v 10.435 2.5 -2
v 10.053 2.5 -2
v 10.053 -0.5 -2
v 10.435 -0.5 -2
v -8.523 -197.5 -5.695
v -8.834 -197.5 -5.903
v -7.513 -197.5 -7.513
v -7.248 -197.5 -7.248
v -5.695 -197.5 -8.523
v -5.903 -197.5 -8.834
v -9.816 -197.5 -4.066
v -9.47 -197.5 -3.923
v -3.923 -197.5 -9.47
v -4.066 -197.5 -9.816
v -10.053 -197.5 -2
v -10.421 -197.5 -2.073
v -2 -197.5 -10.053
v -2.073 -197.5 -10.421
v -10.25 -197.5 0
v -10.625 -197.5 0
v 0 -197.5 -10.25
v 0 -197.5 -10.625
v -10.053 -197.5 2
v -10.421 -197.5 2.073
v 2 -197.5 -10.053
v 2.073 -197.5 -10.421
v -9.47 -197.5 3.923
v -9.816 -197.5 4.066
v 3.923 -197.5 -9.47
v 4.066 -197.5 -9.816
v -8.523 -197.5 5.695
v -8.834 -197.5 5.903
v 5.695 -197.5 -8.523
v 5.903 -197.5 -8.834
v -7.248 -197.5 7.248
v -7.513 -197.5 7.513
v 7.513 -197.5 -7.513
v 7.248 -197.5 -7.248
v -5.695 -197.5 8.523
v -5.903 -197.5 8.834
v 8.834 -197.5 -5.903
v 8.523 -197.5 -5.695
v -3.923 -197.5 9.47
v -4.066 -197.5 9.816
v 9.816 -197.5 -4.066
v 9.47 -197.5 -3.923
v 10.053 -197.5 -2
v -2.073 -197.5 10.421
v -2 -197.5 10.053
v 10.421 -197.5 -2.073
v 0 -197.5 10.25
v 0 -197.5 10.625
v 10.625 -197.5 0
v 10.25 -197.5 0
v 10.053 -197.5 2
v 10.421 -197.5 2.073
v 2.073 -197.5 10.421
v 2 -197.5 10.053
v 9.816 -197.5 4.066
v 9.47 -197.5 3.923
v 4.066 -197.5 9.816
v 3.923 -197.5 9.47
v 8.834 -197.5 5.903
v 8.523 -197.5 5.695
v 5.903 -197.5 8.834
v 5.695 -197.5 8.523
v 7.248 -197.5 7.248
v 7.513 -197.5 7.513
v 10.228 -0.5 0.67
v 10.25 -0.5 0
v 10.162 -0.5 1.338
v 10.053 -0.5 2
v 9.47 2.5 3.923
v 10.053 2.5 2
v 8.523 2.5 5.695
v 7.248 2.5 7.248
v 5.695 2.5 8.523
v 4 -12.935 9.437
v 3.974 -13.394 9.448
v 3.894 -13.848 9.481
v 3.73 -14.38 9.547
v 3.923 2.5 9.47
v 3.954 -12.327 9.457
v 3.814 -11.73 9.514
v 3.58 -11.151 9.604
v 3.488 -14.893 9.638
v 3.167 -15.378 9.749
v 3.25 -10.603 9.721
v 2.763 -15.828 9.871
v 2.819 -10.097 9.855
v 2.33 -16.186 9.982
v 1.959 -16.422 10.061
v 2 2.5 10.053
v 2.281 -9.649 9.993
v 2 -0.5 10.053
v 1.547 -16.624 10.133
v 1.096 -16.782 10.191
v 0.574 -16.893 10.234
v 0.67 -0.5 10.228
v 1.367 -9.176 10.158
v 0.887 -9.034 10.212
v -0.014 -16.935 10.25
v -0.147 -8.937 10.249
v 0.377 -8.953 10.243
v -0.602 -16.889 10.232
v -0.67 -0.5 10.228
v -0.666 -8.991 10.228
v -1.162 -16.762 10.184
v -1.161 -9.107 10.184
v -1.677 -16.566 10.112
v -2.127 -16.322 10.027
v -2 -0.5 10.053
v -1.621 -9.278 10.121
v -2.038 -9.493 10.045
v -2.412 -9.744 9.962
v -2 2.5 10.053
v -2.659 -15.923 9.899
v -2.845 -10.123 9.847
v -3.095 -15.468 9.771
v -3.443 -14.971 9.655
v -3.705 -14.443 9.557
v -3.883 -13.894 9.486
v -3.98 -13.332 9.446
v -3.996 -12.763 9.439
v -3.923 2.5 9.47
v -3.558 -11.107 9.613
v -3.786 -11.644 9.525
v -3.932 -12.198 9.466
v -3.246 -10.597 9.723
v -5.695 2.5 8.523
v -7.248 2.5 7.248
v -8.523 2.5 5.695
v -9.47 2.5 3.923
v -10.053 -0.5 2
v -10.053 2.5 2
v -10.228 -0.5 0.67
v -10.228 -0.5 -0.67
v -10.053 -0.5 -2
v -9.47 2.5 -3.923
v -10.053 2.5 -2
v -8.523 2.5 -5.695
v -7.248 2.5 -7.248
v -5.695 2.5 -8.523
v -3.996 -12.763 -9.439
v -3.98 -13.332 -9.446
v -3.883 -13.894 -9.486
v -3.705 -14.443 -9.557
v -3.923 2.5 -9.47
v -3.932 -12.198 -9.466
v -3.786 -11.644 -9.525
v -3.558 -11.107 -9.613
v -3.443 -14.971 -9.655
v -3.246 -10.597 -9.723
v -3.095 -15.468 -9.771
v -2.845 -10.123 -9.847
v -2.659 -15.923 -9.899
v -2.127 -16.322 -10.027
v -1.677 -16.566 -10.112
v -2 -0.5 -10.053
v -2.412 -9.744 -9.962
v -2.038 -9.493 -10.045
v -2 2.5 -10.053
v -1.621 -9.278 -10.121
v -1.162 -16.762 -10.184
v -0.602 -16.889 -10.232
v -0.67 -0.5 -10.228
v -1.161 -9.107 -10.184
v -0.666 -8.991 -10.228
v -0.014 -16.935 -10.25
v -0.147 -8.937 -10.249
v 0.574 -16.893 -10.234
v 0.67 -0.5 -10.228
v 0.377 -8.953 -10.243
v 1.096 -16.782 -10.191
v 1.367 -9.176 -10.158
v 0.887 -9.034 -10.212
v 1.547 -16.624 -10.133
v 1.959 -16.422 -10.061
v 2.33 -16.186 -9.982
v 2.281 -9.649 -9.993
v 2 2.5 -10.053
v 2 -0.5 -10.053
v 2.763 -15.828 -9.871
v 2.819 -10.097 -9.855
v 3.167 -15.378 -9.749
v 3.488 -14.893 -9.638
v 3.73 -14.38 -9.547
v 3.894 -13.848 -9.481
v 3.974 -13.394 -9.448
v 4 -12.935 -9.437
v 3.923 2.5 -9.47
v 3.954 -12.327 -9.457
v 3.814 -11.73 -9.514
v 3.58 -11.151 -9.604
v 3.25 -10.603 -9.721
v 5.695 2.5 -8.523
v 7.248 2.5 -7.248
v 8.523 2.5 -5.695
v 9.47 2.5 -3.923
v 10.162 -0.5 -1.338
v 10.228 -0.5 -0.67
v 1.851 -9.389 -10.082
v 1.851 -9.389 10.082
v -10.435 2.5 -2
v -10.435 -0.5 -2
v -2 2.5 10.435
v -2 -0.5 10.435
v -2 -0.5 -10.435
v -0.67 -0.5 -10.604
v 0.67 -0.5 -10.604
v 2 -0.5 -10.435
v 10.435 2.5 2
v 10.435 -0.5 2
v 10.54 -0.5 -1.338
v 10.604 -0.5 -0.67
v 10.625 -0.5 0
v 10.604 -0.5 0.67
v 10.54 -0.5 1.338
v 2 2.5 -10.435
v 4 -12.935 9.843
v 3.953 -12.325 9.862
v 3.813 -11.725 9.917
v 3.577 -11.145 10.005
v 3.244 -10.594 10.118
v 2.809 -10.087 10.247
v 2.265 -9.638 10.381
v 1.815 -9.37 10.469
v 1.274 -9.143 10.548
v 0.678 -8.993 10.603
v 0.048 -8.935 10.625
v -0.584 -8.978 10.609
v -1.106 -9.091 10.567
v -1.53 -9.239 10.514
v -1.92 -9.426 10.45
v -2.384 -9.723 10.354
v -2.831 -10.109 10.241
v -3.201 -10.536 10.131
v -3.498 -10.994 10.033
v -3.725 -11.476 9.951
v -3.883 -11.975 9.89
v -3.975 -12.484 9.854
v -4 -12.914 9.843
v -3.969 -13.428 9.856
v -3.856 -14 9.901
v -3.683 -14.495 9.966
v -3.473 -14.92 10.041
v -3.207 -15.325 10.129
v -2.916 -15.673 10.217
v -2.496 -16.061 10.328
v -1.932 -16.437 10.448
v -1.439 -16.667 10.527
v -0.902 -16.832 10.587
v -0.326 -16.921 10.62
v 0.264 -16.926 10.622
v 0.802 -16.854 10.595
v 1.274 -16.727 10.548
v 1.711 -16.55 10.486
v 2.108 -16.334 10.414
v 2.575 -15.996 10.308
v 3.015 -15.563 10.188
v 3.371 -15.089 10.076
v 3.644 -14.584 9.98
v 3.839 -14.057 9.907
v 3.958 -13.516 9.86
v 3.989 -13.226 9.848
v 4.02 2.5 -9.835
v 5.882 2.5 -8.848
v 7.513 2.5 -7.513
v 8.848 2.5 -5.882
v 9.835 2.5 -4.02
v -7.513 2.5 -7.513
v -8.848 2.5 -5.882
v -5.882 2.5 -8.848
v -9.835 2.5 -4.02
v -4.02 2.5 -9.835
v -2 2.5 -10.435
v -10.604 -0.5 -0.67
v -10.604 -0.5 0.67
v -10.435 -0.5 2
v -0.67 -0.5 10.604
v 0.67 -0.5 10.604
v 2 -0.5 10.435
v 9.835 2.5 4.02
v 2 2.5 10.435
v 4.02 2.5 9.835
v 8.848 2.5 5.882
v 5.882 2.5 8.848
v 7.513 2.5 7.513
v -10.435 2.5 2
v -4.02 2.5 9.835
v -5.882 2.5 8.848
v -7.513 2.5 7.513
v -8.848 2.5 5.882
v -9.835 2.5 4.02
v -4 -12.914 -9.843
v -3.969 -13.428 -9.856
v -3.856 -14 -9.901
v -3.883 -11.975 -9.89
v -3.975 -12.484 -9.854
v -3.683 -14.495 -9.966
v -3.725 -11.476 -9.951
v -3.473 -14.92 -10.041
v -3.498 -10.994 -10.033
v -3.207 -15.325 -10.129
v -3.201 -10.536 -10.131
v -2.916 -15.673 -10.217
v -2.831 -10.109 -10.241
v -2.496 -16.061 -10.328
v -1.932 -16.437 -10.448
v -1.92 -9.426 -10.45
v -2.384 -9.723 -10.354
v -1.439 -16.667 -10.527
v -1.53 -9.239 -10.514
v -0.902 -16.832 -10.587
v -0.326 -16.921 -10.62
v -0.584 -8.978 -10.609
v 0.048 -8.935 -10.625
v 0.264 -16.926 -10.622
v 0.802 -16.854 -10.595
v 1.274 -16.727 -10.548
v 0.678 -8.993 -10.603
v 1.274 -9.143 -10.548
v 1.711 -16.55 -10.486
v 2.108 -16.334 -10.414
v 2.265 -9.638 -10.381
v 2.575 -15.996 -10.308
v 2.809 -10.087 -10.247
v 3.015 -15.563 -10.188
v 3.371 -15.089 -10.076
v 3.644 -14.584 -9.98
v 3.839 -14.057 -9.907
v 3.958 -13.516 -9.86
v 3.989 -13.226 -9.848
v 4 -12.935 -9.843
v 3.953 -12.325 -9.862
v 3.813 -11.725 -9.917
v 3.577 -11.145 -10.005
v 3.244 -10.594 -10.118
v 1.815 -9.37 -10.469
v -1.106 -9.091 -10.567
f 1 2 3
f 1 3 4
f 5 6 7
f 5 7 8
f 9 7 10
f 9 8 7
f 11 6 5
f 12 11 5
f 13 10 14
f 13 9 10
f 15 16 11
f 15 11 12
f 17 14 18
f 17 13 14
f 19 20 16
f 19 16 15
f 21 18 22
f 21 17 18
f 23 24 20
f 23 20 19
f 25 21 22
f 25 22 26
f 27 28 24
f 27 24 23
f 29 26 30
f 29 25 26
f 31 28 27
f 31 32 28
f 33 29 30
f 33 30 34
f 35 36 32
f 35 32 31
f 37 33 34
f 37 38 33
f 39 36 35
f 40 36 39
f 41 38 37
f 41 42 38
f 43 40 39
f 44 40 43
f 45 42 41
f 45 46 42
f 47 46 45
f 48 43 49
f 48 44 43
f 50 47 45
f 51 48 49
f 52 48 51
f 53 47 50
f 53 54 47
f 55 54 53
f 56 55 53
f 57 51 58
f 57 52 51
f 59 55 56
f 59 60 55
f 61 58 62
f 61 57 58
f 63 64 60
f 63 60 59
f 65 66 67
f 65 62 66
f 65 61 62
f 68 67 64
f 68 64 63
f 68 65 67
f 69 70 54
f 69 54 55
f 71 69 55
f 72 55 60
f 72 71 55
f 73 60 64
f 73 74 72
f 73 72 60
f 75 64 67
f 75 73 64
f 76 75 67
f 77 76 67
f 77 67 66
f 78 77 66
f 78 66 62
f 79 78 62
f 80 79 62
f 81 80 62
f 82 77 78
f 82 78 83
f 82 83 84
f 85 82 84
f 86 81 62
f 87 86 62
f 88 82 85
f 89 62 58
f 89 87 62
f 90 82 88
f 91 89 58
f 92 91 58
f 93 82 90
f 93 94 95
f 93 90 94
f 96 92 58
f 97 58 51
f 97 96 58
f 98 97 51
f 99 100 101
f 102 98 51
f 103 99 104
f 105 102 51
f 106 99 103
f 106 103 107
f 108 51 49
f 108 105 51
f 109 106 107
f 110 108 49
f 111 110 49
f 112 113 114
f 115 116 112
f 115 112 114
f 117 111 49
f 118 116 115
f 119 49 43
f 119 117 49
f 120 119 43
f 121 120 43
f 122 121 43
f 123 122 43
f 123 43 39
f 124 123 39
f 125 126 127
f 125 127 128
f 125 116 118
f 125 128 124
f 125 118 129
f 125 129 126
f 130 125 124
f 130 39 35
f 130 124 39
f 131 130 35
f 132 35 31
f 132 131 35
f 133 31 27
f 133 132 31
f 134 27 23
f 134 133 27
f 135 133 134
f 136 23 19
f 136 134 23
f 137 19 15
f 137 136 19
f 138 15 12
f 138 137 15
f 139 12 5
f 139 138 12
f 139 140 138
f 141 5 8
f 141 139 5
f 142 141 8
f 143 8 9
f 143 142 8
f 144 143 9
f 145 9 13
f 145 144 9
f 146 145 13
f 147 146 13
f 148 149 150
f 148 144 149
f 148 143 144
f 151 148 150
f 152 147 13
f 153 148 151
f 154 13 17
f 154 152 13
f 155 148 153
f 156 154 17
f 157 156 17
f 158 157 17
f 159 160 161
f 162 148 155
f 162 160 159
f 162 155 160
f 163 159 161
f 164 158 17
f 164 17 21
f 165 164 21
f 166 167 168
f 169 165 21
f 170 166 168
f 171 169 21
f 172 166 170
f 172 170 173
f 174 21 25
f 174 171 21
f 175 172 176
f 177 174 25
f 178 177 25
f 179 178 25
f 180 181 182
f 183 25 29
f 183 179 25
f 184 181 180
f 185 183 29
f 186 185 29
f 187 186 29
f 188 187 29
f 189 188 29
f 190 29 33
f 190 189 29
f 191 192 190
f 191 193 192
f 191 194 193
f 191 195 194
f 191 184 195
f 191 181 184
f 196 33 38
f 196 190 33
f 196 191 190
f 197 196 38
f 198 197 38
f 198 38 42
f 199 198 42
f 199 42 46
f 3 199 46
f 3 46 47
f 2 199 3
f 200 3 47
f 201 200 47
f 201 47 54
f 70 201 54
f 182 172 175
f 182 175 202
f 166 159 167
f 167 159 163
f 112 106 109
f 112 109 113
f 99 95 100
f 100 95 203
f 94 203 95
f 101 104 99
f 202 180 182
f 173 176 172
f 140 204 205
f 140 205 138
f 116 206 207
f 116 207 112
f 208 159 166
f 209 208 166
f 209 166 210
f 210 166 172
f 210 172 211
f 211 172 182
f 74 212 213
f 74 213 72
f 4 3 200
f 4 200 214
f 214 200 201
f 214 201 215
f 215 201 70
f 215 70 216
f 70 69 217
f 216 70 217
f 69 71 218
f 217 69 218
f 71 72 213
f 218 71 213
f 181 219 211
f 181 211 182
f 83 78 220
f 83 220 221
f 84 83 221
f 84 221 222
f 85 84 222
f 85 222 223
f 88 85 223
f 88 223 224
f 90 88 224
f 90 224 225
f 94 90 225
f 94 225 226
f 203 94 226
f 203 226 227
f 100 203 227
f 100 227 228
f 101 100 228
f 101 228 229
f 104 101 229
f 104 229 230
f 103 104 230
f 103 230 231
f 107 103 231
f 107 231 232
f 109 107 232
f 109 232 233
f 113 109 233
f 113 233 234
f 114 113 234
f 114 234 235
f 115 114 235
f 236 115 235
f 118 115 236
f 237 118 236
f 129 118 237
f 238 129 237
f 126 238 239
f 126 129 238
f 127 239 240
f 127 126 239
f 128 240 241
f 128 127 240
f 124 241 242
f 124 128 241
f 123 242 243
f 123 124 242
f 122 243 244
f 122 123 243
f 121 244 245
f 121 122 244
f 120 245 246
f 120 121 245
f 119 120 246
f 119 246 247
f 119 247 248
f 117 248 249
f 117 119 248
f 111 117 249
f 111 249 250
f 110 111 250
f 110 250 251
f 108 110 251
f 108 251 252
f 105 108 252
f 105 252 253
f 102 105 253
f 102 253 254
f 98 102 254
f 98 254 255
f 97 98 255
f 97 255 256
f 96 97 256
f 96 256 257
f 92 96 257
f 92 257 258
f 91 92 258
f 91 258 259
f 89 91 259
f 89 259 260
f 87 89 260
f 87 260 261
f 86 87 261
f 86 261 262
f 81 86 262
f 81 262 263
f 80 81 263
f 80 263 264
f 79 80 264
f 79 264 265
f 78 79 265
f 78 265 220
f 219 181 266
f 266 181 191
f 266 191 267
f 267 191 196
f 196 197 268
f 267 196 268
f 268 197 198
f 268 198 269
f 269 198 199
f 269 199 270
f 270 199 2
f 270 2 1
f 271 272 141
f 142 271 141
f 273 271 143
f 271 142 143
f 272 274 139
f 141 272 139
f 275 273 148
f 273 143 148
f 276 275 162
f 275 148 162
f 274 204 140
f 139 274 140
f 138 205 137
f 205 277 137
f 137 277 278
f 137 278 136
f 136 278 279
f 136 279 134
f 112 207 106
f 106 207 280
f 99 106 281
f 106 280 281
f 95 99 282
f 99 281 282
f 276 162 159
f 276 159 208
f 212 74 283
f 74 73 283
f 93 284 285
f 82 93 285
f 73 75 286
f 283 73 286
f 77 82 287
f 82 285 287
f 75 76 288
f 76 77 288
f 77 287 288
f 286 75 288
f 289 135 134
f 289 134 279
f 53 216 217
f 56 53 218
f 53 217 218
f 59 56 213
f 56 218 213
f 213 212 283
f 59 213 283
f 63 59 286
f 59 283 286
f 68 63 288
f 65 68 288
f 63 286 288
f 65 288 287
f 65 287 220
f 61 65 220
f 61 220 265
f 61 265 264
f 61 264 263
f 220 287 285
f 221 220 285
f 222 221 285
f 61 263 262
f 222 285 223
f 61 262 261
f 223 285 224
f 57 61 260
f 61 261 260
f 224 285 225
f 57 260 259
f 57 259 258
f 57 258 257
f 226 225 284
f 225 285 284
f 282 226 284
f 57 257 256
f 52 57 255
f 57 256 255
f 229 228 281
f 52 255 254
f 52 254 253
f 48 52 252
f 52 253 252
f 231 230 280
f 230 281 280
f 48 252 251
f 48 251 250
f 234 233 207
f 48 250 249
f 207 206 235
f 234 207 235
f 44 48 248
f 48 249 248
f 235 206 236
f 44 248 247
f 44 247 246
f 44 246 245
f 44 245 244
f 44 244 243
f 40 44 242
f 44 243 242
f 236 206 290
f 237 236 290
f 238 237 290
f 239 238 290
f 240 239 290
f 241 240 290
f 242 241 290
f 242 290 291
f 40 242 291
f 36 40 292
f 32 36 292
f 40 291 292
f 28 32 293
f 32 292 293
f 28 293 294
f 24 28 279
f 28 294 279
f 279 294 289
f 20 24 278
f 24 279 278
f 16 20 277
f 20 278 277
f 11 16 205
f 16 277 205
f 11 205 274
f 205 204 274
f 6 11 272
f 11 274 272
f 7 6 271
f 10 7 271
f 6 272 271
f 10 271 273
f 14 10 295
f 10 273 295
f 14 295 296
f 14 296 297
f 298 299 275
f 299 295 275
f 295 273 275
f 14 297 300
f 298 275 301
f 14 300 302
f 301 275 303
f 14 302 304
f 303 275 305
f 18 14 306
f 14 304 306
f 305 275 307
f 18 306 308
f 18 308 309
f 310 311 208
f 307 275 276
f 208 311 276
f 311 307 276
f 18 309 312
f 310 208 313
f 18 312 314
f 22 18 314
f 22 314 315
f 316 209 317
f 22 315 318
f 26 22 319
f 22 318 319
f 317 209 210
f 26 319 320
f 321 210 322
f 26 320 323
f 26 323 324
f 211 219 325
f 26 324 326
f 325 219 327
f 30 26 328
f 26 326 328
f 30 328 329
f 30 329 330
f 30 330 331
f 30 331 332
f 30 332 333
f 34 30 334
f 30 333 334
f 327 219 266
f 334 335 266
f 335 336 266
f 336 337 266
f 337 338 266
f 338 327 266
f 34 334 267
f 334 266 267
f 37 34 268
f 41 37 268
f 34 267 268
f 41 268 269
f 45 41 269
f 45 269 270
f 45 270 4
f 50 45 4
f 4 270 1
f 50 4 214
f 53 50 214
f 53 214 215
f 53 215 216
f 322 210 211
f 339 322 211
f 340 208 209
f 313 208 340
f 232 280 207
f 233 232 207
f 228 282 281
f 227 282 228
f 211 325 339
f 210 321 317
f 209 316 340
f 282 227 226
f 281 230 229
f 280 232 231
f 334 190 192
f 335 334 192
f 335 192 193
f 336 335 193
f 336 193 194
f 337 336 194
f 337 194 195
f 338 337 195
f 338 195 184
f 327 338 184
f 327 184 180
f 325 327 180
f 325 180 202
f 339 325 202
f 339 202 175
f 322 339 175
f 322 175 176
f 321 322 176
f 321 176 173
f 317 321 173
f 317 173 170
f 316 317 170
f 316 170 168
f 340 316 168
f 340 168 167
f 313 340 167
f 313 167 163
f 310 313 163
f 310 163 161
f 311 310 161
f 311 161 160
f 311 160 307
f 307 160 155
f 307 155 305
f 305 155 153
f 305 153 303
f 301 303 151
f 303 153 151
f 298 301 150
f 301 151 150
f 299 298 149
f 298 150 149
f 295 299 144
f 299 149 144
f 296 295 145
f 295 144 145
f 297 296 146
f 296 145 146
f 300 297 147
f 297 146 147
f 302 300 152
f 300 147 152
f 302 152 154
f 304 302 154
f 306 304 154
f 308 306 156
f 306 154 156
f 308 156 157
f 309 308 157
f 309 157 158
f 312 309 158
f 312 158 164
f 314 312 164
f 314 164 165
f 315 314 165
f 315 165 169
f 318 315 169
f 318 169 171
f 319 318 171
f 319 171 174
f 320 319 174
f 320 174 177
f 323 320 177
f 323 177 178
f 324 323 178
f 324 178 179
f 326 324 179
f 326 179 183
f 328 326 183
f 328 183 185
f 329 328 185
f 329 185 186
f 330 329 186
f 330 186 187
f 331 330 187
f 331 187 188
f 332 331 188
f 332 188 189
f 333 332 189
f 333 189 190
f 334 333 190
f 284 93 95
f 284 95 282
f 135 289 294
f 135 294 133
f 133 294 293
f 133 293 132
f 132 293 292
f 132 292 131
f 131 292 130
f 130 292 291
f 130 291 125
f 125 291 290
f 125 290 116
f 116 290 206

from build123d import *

# Parameters (mm, degrees)
SKETCH011_R          = 10.625
SKETCH011_R_2        = 10.25
PAD003_DEPTH         = 200
SKETCH018_R          = 4
POCKET008_DEPTH      = 50
POCKET008_DEPTH_BACK = 50
POCKET009_DEPTH      = 3


with BuildPart() as part:
    # Sketch011 → Pad003 (new body)
    with BuildSketch(Plane.XZ):
        Circle(SKETCH011_R)
        Circle(SKETCH011_R_2, mode=Mode.SUBTRACT)
    extrude(amount=PAD003_DEPTH)

    # Sketch018 → Pocket008 (cut, two sides)
    with BuildSketch(Plane.XY) as pocket008_sk:
        with Locations((0, -15.434778)):
            Circle(SKETCH018_R)
    extrude(amount=-POCKET008_DEPTH, mode=Mode.SUBTRACT)
    extrude(pocket008_sk.sketch, amount=POCKET008_DEPTH_BACK, mode=Mode.SUBTRACT)

    # Sketch019 → Pocket009 (cut)
    with BuildSketch(Plane.XZ):
        Polygon((12, -2), (12, 2), (2, 2), (2, 12), (-2, 12), (-2, 2), (-12, 2), (-12, -2), (-2, -2), (-2, -12), (2, -12), (2, -2), align=None)
    extrude(amount=POCKET009_DEPTH, mode=Mode.SUBTRACT)


with BuildPart() as part_1:
    # Body003 placement: moved
    add(part.part.moved(Location((0, 2.5, 0))))


solid = part_1.part
